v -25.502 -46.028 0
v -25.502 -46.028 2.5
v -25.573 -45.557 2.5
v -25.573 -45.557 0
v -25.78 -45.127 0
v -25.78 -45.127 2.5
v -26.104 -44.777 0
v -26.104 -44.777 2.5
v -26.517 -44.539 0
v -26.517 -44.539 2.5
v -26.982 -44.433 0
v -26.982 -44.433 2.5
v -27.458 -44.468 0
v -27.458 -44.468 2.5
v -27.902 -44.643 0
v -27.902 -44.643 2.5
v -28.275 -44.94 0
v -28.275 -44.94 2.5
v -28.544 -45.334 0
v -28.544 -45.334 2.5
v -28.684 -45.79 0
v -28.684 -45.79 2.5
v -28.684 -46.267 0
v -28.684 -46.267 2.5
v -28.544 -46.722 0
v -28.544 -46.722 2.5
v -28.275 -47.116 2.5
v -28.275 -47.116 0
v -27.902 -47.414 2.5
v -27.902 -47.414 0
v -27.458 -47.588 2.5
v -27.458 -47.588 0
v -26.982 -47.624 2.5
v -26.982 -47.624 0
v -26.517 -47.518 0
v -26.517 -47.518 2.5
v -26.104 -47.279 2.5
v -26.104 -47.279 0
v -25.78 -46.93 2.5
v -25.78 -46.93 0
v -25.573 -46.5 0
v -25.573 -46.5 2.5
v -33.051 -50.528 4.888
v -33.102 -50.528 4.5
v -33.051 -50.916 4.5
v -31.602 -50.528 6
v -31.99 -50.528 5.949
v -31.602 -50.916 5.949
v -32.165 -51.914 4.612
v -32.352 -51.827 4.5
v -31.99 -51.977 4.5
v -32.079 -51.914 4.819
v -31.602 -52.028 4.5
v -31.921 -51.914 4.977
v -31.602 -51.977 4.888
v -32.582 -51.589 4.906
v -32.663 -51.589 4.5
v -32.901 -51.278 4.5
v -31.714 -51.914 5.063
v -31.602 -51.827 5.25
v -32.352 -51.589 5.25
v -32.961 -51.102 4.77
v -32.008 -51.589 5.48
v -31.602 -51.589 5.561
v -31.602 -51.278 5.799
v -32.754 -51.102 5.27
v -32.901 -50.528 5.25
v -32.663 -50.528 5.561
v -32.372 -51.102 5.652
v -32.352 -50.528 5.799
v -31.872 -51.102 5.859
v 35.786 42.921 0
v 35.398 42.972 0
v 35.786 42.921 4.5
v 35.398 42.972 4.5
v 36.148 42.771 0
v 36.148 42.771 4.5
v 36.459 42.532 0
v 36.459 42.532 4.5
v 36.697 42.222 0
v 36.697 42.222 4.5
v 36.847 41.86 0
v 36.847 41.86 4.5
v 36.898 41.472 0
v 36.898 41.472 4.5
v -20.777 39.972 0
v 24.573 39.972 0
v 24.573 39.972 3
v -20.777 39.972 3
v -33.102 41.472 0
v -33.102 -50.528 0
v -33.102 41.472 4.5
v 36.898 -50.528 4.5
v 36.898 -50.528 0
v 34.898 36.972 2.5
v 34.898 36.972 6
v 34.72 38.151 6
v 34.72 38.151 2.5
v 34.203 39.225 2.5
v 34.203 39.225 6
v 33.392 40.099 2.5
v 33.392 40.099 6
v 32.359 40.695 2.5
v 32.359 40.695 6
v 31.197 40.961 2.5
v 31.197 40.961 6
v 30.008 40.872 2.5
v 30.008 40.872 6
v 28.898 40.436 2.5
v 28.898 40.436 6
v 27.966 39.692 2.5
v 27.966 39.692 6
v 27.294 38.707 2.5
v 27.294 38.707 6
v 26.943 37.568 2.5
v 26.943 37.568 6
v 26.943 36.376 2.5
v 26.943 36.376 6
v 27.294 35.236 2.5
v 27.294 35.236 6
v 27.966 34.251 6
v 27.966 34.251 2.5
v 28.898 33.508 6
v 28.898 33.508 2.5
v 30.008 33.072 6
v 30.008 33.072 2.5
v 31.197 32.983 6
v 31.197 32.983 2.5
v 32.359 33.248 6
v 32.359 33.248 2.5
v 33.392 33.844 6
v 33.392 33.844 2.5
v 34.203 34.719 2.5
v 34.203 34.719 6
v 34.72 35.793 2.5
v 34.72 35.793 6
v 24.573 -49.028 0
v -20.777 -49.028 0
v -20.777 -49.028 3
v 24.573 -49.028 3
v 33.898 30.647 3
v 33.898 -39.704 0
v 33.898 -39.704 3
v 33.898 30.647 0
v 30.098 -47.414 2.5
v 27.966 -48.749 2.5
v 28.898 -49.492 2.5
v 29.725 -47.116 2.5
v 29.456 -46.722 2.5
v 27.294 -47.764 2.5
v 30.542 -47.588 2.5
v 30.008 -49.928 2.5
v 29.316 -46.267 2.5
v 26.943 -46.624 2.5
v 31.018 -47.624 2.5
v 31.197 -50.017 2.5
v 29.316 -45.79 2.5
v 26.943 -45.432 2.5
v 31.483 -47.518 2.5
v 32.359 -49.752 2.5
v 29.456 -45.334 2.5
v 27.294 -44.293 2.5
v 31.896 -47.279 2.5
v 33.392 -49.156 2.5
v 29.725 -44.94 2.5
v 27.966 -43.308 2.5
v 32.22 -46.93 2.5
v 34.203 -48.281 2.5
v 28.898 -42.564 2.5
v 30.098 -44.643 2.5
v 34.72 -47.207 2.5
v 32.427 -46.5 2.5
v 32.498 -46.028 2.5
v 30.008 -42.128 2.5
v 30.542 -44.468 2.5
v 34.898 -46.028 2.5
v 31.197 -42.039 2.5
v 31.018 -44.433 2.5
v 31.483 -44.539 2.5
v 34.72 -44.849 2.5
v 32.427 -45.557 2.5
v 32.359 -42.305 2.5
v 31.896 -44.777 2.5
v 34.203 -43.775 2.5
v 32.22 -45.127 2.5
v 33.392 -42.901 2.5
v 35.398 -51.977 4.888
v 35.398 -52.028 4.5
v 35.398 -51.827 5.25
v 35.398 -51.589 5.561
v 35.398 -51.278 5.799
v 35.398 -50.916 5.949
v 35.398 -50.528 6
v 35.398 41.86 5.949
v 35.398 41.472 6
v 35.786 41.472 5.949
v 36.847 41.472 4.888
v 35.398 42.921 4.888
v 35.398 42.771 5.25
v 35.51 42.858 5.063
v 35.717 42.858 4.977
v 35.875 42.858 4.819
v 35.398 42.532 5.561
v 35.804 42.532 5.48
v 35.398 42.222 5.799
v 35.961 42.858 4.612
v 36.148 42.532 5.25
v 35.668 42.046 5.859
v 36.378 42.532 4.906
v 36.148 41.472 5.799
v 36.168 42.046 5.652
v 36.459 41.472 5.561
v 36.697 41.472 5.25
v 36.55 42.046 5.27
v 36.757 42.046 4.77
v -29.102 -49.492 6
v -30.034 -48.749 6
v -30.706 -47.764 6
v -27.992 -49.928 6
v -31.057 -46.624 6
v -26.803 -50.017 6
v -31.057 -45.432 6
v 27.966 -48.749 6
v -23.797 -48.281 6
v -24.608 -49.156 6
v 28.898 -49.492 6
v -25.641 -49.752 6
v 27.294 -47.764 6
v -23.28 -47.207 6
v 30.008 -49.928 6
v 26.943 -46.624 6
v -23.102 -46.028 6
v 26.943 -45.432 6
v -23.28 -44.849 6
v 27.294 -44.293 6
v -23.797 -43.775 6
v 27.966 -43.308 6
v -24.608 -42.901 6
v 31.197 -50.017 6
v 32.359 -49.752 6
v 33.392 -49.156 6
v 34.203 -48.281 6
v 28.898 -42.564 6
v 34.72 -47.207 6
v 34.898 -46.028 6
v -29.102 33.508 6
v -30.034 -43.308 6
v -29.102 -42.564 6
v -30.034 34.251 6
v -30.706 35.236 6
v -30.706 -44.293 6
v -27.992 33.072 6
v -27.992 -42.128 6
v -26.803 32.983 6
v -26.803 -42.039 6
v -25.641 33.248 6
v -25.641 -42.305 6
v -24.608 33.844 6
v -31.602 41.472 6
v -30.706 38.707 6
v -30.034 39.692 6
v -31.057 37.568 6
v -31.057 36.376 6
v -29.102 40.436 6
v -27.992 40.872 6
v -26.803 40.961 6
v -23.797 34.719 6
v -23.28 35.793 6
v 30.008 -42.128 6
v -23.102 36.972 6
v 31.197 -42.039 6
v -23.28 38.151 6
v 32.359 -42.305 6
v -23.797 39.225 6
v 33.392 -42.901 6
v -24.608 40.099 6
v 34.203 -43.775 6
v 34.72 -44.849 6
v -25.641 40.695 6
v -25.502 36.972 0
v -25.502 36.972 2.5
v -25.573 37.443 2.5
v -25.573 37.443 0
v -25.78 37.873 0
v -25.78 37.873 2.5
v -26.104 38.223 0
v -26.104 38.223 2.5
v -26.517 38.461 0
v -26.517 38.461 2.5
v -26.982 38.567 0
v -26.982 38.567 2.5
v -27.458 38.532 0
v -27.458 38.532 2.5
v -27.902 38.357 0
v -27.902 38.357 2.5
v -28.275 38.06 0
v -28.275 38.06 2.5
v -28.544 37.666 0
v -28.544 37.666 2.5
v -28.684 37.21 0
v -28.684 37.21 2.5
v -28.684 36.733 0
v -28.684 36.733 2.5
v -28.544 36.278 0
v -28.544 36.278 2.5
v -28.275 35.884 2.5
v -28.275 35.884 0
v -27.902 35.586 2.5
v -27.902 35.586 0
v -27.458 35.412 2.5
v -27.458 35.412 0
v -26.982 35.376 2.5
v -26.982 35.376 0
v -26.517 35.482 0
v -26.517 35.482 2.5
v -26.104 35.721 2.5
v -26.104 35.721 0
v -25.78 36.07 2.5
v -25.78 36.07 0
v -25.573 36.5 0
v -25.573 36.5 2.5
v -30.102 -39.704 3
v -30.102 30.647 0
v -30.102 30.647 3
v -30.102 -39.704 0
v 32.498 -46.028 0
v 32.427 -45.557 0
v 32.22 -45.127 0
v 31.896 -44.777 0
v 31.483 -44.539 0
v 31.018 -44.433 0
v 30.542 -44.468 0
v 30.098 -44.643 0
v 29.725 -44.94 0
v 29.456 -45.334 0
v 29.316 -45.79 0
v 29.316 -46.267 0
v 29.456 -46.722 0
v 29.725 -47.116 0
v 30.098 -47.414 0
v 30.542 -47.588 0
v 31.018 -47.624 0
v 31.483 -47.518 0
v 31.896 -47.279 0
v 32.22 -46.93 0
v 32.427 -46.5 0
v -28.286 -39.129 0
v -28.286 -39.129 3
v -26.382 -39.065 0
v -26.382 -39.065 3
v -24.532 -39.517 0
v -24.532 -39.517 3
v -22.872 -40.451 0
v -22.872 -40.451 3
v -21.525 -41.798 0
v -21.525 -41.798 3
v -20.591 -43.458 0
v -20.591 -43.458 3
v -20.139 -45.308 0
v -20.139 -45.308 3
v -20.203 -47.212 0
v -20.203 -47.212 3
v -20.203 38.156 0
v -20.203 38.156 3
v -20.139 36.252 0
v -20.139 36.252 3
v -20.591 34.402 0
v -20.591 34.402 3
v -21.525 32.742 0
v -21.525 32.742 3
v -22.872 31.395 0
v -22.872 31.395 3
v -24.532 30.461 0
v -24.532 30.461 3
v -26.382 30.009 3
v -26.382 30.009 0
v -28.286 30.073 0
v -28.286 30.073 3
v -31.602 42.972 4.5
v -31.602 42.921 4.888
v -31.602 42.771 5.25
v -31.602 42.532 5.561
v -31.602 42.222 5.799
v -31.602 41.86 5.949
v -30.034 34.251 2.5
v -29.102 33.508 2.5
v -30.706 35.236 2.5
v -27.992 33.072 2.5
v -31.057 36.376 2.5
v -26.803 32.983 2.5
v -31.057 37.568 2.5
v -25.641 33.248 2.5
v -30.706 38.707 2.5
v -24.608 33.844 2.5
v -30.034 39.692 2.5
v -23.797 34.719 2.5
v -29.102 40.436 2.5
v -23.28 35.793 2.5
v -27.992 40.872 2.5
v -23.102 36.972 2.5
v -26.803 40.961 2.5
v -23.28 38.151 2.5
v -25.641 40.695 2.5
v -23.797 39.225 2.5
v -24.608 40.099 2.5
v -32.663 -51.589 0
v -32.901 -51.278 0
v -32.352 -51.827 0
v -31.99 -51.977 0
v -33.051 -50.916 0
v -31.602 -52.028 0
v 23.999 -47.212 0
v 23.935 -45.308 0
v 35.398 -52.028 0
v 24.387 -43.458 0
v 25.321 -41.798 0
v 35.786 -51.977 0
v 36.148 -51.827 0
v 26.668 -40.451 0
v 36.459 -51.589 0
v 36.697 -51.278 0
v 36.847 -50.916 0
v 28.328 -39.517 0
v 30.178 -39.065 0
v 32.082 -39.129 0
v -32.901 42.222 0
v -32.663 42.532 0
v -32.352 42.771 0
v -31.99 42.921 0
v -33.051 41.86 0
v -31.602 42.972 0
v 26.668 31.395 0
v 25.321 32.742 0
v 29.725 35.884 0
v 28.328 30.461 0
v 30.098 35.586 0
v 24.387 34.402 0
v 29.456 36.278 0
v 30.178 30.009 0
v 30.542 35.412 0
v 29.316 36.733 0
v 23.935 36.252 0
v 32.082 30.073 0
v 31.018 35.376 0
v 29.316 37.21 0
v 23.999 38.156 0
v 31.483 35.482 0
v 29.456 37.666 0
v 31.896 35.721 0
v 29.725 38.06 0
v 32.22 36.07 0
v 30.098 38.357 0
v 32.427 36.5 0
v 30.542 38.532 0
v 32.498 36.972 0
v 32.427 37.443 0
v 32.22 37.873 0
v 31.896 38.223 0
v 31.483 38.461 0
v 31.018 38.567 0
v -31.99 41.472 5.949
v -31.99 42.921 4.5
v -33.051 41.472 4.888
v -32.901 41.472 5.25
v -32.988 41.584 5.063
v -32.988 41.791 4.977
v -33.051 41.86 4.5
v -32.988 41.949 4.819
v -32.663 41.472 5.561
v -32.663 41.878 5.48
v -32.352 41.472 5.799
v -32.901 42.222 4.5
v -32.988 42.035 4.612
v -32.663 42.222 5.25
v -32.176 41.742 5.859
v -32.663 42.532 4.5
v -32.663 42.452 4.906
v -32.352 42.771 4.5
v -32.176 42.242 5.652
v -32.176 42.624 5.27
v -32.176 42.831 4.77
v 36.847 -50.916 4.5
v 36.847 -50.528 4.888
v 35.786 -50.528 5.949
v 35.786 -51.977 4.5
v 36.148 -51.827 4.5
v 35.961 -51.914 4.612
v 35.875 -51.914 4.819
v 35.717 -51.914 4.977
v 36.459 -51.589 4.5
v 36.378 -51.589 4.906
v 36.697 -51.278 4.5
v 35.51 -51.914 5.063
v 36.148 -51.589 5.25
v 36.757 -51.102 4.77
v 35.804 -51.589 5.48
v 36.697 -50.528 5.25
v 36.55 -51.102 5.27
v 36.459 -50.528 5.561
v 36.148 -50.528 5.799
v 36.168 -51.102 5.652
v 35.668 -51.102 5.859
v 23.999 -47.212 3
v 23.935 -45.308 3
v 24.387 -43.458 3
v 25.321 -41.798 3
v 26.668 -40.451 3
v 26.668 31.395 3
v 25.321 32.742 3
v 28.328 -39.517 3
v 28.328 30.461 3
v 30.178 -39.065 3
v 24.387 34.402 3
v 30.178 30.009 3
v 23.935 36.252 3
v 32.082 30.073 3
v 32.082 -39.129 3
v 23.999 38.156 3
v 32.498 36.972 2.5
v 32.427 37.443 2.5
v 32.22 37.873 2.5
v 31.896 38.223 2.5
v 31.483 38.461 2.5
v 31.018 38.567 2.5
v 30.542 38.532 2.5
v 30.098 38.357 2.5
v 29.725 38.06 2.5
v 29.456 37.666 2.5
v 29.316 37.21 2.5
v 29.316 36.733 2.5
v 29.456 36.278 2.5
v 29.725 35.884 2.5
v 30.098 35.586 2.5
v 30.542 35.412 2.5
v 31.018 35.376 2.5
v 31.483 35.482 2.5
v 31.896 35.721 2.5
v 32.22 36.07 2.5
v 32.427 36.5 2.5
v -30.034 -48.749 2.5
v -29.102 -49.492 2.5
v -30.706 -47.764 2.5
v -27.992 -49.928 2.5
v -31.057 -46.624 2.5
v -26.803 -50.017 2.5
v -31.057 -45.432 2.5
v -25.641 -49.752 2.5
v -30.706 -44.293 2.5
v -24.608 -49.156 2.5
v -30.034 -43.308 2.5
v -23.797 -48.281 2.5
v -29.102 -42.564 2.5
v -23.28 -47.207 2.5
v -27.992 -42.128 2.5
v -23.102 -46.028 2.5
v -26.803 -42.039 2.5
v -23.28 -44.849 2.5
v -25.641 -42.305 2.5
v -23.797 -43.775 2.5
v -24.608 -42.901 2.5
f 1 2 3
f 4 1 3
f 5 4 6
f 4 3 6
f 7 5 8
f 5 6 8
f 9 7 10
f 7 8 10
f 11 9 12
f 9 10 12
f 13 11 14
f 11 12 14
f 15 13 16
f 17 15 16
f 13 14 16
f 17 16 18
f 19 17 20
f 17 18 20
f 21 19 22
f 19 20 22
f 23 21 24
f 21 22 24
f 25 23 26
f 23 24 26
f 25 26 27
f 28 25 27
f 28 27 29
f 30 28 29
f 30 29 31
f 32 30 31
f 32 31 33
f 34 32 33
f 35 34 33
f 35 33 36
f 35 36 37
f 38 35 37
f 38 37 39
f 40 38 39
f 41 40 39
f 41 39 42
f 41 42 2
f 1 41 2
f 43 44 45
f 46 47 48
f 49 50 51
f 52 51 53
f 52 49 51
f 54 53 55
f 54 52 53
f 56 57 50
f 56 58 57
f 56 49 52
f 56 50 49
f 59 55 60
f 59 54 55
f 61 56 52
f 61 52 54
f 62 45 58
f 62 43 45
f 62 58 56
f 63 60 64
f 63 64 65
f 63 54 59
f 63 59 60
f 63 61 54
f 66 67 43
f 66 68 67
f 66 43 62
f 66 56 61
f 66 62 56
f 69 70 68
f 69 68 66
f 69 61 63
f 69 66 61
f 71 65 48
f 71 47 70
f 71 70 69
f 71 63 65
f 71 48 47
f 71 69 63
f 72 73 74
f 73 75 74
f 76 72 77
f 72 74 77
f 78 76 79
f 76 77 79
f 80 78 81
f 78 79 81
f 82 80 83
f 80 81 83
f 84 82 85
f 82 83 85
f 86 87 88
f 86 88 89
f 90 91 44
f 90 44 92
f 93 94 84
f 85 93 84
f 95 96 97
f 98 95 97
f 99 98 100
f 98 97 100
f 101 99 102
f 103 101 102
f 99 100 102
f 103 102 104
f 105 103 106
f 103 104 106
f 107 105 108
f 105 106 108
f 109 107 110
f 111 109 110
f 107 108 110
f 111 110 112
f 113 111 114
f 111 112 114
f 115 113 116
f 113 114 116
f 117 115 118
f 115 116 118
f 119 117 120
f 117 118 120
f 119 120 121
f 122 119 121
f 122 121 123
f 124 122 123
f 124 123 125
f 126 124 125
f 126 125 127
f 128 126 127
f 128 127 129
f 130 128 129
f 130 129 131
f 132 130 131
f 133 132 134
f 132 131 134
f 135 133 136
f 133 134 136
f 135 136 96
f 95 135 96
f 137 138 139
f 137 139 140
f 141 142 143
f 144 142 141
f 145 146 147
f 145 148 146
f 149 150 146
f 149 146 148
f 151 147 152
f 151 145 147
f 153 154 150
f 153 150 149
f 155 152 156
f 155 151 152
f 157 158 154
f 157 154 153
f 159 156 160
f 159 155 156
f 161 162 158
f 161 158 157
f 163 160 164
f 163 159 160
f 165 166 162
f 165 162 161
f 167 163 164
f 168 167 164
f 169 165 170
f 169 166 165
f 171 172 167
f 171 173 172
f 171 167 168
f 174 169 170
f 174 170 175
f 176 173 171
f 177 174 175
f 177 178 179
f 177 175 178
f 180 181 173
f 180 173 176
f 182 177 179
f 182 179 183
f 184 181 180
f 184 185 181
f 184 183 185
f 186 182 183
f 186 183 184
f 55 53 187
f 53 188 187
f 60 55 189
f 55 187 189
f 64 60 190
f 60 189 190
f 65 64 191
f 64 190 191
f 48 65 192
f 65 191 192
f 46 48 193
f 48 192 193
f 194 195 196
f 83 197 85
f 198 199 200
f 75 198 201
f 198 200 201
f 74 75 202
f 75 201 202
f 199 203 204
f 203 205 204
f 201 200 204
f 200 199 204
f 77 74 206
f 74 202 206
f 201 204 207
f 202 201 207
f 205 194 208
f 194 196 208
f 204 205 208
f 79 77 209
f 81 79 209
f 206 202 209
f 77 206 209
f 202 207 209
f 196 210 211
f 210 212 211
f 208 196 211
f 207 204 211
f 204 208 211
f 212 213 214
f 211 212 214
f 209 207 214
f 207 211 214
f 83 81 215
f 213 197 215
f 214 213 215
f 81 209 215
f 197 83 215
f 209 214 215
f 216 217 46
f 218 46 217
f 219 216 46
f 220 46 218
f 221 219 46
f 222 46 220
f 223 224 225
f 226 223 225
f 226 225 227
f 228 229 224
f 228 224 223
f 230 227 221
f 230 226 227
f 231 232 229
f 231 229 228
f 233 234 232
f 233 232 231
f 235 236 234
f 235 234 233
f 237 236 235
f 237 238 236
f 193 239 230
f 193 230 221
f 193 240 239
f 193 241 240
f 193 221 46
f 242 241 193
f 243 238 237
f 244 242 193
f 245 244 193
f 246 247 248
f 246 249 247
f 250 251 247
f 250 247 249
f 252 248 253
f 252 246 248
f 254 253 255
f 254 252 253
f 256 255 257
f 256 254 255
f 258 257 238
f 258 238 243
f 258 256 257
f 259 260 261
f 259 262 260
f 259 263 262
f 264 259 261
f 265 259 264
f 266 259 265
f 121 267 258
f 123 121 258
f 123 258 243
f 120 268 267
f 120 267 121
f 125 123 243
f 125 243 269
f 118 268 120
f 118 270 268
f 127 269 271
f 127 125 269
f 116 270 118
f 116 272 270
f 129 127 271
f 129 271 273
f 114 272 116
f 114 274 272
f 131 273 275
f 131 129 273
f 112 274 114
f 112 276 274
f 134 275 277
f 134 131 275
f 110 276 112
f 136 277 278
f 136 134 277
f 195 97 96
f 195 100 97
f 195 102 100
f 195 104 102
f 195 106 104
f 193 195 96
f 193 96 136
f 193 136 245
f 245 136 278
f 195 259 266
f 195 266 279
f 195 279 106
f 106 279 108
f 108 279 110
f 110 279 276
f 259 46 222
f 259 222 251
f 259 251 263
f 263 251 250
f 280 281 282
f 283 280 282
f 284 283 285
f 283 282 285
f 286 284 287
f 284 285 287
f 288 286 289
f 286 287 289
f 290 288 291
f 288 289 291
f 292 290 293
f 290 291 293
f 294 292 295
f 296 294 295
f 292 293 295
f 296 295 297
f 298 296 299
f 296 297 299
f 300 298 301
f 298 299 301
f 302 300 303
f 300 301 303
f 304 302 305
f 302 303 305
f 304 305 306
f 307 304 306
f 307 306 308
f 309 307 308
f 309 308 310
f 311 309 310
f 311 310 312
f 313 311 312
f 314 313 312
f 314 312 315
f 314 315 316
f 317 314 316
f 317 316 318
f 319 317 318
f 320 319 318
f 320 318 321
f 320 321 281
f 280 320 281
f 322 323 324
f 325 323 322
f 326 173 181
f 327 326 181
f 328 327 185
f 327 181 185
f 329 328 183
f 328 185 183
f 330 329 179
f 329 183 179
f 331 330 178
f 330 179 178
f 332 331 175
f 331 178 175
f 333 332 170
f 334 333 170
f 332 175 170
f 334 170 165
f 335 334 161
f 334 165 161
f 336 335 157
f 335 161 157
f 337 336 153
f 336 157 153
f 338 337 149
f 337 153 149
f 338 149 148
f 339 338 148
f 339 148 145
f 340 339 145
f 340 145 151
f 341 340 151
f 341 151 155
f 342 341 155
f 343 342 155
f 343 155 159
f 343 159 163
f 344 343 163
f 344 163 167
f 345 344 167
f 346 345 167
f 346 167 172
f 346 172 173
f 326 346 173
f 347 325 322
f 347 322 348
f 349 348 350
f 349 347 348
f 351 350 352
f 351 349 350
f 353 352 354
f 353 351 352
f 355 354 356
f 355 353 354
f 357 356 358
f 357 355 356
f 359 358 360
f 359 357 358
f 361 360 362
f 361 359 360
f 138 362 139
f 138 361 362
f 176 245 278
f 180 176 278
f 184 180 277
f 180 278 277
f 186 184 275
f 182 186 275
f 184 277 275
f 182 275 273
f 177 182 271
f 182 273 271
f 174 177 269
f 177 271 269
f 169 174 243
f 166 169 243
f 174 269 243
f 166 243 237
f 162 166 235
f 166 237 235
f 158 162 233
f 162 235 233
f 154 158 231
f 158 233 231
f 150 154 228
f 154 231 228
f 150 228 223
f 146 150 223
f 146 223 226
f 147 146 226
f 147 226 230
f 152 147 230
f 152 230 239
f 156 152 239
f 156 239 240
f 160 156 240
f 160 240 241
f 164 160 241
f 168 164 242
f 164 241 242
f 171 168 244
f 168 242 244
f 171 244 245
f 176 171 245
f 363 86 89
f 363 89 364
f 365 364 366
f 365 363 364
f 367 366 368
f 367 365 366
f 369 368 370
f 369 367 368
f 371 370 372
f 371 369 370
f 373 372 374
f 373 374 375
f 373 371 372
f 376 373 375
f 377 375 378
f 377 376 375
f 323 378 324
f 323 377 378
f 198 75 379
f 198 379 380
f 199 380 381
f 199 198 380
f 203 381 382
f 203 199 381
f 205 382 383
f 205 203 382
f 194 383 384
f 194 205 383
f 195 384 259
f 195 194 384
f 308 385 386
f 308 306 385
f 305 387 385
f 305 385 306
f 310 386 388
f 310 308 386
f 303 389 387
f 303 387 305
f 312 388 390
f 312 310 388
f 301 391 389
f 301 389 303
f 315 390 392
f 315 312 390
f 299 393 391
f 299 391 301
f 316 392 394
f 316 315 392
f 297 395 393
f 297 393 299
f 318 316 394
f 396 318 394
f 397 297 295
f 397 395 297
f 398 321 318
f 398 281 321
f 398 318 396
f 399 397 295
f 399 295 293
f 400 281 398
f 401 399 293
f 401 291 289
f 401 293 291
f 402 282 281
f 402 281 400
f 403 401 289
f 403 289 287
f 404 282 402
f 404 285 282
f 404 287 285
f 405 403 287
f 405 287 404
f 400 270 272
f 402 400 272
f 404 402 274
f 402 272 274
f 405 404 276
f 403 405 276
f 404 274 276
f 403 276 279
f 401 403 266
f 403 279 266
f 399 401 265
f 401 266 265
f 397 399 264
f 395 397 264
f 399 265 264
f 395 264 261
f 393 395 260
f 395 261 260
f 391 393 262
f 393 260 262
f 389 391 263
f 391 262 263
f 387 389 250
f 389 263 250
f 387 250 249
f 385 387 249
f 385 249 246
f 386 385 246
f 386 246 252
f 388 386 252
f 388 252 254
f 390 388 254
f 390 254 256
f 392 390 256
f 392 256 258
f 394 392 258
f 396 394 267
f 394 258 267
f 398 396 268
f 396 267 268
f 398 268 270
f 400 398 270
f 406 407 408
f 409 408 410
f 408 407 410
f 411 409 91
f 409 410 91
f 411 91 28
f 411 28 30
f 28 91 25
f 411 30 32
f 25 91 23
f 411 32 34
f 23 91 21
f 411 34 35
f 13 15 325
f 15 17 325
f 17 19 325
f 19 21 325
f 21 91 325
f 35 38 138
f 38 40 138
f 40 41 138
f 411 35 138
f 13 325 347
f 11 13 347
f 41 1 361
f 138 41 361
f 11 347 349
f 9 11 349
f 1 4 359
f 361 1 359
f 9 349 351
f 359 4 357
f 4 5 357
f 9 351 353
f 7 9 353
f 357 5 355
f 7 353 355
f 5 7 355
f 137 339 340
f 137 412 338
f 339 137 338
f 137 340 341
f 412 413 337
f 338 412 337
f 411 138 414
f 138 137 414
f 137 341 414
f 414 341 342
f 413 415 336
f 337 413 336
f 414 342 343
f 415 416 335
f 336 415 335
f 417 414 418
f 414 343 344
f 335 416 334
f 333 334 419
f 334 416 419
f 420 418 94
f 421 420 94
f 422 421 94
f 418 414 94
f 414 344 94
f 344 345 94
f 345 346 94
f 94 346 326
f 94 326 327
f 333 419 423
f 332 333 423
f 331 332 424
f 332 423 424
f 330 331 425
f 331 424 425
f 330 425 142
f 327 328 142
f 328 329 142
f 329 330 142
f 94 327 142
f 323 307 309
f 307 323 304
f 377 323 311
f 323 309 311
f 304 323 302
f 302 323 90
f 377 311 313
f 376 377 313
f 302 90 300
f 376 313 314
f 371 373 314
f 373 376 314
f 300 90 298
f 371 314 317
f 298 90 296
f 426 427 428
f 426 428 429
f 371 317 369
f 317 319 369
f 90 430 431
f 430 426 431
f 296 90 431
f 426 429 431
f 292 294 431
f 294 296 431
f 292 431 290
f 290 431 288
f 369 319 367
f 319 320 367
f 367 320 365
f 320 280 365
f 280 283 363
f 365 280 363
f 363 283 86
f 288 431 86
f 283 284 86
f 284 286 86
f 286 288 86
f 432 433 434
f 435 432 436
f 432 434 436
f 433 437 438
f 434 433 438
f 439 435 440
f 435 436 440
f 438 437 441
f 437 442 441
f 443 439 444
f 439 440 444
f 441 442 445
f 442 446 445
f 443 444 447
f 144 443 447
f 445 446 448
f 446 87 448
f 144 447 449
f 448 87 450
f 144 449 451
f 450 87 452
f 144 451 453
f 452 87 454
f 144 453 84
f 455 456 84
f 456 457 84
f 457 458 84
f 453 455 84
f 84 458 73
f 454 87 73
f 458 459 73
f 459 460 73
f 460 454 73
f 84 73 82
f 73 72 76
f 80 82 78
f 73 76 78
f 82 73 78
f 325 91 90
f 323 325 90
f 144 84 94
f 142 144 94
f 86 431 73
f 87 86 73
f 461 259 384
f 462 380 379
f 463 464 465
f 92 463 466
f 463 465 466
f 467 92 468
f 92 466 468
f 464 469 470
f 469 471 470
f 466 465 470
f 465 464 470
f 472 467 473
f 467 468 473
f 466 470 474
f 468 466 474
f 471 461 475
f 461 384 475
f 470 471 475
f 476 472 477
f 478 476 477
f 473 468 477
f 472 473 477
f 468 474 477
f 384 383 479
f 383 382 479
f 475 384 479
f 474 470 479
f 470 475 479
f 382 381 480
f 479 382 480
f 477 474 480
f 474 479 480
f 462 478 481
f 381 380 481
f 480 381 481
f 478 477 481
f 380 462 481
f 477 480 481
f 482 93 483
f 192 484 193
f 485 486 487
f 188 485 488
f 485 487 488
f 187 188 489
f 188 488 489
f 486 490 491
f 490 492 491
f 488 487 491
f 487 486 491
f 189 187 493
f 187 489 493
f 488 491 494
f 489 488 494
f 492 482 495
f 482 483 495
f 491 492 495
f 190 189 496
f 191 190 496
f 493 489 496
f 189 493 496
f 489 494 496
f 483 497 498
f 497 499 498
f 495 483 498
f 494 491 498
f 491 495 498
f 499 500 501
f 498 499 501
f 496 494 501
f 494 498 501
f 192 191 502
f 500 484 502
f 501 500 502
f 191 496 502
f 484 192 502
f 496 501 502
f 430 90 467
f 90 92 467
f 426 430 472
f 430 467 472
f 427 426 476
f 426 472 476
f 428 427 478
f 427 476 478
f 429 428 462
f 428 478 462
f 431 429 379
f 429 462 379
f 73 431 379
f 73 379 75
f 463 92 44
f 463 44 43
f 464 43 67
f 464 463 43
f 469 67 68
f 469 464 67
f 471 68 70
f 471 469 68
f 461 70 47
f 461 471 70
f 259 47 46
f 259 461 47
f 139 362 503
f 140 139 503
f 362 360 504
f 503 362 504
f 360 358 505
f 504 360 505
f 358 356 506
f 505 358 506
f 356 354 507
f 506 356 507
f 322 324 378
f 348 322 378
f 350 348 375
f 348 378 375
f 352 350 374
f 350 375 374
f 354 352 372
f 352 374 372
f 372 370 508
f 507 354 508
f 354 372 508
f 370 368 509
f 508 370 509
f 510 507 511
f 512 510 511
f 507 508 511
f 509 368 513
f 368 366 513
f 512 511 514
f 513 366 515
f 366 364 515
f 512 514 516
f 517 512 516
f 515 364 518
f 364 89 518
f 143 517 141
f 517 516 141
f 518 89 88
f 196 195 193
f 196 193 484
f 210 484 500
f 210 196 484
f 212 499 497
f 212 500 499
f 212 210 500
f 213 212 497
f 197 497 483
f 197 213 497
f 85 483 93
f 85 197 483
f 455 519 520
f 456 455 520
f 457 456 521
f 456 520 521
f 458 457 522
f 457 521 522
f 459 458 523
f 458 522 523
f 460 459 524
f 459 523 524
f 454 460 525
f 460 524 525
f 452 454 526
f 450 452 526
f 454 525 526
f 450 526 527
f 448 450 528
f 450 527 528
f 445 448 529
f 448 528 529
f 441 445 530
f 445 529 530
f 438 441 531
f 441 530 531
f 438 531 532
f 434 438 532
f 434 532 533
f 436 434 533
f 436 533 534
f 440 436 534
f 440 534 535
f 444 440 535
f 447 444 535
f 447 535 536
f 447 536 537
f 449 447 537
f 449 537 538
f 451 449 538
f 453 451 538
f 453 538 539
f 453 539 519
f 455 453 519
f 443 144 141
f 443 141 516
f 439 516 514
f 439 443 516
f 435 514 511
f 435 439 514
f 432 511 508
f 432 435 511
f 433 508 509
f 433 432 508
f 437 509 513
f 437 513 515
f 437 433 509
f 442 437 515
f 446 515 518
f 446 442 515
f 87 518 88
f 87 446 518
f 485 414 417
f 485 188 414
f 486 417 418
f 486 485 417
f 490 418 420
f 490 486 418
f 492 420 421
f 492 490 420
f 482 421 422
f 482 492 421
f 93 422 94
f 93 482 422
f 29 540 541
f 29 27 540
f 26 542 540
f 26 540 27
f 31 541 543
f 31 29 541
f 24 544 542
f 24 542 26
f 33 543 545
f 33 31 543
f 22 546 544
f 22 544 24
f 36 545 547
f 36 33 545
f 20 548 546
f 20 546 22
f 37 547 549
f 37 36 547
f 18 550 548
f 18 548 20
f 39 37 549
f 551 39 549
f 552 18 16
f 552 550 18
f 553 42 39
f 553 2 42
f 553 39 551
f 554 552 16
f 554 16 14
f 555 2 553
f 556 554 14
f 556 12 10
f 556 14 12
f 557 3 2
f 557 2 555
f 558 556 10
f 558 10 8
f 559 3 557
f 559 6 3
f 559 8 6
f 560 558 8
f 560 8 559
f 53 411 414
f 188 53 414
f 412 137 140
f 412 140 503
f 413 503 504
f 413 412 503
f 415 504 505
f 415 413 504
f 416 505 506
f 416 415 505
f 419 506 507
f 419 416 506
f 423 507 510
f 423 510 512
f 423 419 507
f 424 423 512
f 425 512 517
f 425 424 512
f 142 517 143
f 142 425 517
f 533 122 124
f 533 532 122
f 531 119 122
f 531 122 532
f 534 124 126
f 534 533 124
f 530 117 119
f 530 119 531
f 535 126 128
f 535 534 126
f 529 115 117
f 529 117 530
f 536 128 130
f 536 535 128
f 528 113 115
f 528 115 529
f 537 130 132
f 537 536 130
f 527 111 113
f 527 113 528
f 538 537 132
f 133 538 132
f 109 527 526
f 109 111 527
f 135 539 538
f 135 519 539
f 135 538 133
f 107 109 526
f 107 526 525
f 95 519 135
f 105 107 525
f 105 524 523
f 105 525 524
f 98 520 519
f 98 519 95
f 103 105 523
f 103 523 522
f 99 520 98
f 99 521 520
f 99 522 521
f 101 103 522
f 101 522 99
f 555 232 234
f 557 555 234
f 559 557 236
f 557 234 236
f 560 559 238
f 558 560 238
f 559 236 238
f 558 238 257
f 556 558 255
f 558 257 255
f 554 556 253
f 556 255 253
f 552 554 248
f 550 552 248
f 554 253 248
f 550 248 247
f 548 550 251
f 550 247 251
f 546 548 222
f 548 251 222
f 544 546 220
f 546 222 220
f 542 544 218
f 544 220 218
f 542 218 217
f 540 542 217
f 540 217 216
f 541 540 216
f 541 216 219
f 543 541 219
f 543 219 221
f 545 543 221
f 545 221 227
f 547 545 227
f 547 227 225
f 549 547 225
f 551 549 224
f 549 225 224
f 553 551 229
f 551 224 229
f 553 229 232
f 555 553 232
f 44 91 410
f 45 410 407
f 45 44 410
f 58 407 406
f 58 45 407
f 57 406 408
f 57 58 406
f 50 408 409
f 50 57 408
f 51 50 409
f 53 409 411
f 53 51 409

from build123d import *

# Parameters (mm, degrees)
SKETCH_1_W          = 70
SKETCH_1_H          = 95
EXTRUDE_1_DEPTH     = 6
SKETCH_2_R          = 4
CUT_EXTRUDE_1_DEPTH = 3.5
SKETCH_3_R          = 1.6
CUT_EXTRUDE_2_DEPTH = 65.065587298
SHELL_1_DEPTH       = 3
FILLET_1_R          = 1.5


# Read off the part's stored shape, not the designer's step: 抽壳1
with BuildPart() as part:
    # 草图1 → 凸台-拉伸1 (new body)
    with BuildSketch(Plane.XY):
        with Locations((1.898047722, -4.528199566)):
            Rectangle(SKETCH_1_W, SKETCH_1_H)
    extrude(amount=EXTRUDE_1_DEPTH)

    # 草图2 → 切除-拉伸1 (cut)
    with BuildSketch(Plane.XY.offset(6)):
        with Locations((30.898047722, 36.971800434)):
            Circle(SKETCH_2_R)
        with Locations((-27.101952278, 36.971800434)):
            Circle(SKETCH_2_R)
        with Locations((30.898047722, -46.028199566)):
            Circle(SKETCH_2_R)
        with Locations((-27.101952278, -46.028199566)):
            Circle(SKETCH_2_R)
    extrude(amount=-CUT_EXTRUDE_1_DEPTH, mode=Mode.SUBTRACT)

    # 草图3 → 切除-拉伸2 (cut, through all)
    with BuildSketch(Plane.XY.offset(6)):
        with Locations((30.898047722, 36.971800434)):
            Circle(SKETCH_3_R)
        with Locations((-27.101952278, 36.971800434)):
            Circle(SKETCH_3_R)
        with Locations((-27.101952278, -46.028199566)):
            Circle(SKETCH_3_R)
        with Locations((30.898047722, -46.028199566)):
            Circle(SKETCH_3_R)
    extrude(amount=-CUT_EXTRUDE_2_DEPTH, mode=Mode.SUBTRACT)

    # 抽壳1 outline → 抽壳1 (cut)
    with BuildSketch(Plane.XY):
        with BuildLine():
            Line((-30.101952278, 30.647245114), (-30.101952278, -39.703644246))
            ThreePointArc((-30.101952278, -39.703644246), (-22.152204809, -41.078452098), (-20.777396957, -49.028199566))
            Line((-20.777396957, -49.028199566), (24.573492402, -49.028199566))
            ThreePointArc((24.573492402, -49.028199566), (25.948300254, -41.078452098), (33.898047722, -39.703644246))
            Line((33.898047722, -39.703644246), (33.898047722, 30.647245114))
            ThreePointArc((33.898047722, 30.647245114), (25.948300254, 32.022052966), (24.573492402, 39.971800434))
            Line((24.573492402, 39.971800434), (-20.777396957, 39.971800434))
            ThreePointArc((-20.777396957, 39.971800434), (-22.152204809, 32.022052966), (-30.101952278, 30.647245114))
        make_face()
    extrude(amount=SHELL_1_DEPTH, mode=Mode.SUBTRACT)

    # 圆角1
    fillet_1_edges = [part.edges().sort_by_distance(p)[0] for p in [
        (36.898047722, -4.528199566, 6),
        (1.898047722, 42.971800434, 6),
        (-33.101952278, -4.528199566, 6),
        (-33.101952278, 42.971800434, 3),
        (36.898047722, 42.971800434, 3),
        (36.898047722, -52.028199566, 3),
        (-33.101952278, -52.028199566, 3),
        (1.898047722, -52.028199566, 6),
    ]]
    fillet(fillet_1_edges, radius=FILLET_1_R)


solid = part.part
